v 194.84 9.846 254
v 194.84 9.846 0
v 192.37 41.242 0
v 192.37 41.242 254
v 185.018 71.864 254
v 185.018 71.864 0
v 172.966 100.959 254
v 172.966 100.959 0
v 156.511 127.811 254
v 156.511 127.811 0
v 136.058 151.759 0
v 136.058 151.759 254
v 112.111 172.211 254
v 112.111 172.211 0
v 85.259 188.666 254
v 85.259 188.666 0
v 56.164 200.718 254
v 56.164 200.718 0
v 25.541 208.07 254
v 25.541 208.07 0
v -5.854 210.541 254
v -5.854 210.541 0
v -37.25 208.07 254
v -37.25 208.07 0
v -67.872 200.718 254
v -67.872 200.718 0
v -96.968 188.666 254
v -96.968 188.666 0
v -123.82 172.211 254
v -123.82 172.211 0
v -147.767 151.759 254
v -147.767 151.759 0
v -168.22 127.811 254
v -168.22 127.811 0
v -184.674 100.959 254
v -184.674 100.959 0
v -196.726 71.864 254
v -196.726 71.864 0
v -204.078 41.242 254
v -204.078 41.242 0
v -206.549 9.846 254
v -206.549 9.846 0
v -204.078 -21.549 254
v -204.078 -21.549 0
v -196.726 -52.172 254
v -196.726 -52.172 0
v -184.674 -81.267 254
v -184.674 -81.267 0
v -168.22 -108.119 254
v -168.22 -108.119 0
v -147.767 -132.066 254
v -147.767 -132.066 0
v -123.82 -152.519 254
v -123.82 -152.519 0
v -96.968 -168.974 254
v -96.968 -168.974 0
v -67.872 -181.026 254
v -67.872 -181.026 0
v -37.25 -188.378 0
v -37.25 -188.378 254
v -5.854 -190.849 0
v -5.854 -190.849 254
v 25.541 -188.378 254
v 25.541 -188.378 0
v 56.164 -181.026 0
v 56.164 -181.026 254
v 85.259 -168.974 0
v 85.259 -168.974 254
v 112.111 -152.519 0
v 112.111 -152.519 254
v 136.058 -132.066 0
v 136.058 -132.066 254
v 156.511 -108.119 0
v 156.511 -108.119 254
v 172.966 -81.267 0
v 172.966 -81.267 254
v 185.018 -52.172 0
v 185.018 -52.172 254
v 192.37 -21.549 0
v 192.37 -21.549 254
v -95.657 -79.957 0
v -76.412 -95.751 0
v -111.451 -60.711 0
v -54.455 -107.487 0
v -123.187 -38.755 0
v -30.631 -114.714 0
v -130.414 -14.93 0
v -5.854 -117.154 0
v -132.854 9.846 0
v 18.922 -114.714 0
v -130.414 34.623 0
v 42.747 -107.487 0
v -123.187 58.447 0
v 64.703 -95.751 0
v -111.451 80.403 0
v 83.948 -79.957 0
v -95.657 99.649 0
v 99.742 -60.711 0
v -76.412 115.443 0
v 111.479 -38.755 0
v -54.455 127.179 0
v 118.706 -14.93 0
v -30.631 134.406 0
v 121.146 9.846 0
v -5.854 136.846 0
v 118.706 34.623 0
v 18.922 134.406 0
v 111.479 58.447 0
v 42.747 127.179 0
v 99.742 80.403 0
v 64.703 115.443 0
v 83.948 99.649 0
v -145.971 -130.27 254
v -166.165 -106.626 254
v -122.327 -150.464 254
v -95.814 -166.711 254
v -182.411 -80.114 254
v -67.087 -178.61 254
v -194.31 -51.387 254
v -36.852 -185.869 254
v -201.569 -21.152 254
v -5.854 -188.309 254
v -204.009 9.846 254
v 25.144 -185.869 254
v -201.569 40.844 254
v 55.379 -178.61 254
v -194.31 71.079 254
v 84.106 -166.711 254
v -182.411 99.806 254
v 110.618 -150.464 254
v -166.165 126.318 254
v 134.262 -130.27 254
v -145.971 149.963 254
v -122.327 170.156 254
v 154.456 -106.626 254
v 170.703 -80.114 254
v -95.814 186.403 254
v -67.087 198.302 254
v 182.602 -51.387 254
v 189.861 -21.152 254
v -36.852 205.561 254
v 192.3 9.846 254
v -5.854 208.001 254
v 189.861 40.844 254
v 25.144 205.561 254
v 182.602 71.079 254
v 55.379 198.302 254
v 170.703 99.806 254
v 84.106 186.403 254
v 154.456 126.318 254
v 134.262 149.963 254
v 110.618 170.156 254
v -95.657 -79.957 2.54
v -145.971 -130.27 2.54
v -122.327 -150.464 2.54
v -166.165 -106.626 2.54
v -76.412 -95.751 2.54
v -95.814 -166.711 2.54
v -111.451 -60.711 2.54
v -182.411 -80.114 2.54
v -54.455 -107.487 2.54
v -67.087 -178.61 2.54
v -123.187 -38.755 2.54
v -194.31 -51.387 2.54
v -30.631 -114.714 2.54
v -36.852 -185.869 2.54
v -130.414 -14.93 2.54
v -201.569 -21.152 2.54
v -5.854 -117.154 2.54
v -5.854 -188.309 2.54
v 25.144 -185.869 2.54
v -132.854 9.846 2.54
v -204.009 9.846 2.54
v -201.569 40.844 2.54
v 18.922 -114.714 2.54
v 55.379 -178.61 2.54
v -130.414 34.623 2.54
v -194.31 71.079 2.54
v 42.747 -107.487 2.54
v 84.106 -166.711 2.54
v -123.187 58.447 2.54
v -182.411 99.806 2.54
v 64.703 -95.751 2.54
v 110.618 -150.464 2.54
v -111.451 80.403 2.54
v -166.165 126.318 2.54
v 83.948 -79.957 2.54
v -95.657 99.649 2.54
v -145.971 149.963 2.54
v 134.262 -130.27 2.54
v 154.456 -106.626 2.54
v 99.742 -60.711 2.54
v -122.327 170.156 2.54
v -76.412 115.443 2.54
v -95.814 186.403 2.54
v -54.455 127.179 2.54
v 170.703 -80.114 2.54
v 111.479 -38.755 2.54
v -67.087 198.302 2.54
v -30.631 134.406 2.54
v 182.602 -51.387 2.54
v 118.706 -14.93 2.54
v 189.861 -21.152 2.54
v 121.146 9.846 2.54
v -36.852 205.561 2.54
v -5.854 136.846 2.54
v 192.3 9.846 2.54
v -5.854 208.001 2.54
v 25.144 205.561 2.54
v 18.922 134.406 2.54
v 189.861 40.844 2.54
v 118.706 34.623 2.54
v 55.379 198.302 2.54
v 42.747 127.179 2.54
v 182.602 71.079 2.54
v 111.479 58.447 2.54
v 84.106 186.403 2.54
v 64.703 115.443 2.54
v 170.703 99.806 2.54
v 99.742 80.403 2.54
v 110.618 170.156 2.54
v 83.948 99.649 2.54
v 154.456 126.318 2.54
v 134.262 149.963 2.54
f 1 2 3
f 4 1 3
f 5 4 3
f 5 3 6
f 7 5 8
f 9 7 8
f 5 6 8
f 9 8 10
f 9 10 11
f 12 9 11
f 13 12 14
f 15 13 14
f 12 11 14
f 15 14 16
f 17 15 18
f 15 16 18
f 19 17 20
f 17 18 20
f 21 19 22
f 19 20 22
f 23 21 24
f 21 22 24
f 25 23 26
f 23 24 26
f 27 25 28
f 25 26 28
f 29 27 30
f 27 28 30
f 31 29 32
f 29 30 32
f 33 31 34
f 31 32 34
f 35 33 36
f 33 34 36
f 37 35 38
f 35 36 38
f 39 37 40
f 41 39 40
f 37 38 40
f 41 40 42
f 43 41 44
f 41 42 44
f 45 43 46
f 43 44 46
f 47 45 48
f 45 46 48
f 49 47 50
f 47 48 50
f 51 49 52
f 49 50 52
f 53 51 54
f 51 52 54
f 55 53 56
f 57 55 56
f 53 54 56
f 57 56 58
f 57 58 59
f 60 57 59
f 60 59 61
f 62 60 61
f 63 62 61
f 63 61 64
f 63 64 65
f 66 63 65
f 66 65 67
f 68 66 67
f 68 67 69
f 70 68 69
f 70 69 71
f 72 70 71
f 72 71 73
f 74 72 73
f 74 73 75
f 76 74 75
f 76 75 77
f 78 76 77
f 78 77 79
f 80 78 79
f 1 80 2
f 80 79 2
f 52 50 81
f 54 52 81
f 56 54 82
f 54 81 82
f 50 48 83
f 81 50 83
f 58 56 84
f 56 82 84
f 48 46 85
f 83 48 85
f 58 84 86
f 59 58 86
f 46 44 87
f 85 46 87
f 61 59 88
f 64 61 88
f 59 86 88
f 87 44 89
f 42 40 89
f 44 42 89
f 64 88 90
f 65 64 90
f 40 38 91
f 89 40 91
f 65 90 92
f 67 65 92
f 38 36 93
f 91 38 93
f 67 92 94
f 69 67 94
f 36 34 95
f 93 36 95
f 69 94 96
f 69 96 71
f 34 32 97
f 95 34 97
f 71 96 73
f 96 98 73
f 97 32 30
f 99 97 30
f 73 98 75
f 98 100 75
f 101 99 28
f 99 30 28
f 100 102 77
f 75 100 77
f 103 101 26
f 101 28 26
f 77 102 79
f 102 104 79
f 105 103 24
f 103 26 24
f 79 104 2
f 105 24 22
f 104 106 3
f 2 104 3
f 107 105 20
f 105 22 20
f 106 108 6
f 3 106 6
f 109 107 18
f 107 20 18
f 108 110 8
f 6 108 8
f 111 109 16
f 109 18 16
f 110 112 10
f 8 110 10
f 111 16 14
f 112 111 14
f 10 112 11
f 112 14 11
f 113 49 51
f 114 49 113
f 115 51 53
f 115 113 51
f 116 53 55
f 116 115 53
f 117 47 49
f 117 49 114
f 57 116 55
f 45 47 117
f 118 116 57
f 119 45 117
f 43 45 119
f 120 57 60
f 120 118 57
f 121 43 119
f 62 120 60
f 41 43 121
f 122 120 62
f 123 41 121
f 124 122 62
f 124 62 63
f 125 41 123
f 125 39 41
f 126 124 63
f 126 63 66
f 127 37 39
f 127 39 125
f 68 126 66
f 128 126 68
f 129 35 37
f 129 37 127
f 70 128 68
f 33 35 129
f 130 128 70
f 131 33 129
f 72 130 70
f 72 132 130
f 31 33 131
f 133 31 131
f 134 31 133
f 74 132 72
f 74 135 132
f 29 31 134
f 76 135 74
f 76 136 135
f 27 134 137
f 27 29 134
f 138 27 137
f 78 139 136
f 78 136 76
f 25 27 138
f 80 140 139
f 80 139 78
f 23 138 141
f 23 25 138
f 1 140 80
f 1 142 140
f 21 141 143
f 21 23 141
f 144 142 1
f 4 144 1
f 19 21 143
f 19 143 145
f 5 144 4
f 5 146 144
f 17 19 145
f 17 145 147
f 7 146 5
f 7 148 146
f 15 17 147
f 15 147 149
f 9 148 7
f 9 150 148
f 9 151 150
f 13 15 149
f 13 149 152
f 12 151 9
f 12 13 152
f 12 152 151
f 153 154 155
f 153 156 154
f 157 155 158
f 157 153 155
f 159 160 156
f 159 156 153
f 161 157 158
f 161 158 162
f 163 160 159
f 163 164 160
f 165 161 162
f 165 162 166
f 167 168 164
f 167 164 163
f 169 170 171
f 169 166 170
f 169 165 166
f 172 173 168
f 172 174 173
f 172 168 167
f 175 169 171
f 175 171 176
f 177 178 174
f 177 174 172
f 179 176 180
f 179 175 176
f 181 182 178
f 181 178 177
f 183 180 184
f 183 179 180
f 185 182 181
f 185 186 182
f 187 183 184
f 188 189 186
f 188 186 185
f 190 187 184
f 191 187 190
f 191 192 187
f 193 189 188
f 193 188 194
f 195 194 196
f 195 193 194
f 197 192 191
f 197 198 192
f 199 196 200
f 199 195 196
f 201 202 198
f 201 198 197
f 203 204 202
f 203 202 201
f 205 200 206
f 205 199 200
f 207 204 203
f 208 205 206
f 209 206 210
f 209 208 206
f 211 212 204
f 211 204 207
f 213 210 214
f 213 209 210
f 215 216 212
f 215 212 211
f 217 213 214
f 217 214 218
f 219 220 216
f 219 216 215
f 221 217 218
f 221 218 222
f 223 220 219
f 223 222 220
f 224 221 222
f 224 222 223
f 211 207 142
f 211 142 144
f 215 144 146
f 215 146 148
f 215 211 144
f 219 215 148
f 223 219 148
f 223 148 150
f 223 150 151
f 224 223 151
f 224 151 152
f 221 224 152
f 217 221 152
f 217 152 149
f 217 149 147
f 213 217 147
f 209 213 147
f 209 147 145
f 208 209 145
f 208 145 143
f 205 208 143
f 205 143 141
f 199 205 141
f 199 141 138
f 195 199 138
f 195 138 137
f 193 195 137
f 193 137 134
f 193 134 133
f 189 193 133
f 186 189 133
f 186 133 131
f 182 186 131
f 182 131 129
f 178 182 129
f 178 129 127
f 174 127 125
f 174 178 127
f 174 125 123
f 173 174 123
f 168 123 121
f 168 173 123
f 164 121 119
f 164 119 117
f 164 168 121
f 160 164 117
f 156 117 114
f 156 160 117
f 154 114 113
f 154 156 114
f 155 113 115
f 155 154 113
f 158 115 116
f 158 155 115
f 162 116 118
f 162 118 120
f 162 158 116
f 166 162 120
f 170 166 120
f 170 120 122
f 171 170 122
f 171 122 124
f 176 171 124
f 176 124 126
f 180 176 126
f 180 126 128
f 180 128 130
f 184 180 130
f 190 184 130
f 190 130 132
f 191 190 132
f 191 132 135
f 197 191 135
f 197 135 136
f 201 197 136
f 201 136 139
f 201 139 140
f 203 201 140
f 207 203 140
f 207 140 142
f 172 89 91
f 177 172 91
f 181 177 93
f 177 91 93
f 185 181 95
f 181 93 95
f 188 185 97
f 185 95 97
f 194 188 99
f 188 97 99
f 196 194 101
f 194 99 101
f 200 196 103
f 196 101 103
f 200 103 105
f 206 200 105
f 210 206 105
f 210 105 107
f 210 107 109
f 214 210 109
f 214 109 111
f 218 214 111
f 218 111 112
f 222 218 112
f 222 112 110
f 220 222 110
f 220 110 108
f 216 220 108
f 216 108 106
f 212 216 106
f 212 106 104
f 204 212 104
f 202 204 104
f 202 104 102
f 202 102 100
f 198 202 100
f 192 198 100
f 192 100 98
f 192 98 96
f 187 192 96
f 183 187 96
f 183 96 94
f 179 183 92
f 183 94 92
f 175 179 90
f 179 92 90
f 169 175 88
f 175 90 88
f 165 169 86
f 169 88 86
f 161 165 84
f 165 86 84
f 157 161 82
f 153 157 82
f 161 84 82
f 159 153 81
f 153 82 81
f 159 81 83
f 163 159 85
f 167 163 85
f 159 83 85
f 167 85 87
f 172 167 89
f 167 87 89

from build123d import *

# Parameters (mm, degrees)
F0_R     = 200.694583
F1_DEPTH = 254
F2_T     = -2.54
F4_D     = 254


with BuildPart() as f1:
    # F0 (on Top) → F1 (new body)
    with BuildSketch(Plane.XY):
        with Locations((-5.854189, 9.84606)):
            Circle(F0_R)
    extrude(amount=F1_DEPTH)

    # F2
    f2_openings = [f1.faces().sort_by_distance(p)[0] for p in [
        (-5.854189, 9.84606, 254),
    ]]
    offset(amount=F2_T, openings=f2_openings)

    # F4 (through all)
    with Locations(Plane.XY.offset(2.54)):
        with Locations((-5.854189, 9.84606)):
            Hole(F4_D / 2)


solid = f1.part
